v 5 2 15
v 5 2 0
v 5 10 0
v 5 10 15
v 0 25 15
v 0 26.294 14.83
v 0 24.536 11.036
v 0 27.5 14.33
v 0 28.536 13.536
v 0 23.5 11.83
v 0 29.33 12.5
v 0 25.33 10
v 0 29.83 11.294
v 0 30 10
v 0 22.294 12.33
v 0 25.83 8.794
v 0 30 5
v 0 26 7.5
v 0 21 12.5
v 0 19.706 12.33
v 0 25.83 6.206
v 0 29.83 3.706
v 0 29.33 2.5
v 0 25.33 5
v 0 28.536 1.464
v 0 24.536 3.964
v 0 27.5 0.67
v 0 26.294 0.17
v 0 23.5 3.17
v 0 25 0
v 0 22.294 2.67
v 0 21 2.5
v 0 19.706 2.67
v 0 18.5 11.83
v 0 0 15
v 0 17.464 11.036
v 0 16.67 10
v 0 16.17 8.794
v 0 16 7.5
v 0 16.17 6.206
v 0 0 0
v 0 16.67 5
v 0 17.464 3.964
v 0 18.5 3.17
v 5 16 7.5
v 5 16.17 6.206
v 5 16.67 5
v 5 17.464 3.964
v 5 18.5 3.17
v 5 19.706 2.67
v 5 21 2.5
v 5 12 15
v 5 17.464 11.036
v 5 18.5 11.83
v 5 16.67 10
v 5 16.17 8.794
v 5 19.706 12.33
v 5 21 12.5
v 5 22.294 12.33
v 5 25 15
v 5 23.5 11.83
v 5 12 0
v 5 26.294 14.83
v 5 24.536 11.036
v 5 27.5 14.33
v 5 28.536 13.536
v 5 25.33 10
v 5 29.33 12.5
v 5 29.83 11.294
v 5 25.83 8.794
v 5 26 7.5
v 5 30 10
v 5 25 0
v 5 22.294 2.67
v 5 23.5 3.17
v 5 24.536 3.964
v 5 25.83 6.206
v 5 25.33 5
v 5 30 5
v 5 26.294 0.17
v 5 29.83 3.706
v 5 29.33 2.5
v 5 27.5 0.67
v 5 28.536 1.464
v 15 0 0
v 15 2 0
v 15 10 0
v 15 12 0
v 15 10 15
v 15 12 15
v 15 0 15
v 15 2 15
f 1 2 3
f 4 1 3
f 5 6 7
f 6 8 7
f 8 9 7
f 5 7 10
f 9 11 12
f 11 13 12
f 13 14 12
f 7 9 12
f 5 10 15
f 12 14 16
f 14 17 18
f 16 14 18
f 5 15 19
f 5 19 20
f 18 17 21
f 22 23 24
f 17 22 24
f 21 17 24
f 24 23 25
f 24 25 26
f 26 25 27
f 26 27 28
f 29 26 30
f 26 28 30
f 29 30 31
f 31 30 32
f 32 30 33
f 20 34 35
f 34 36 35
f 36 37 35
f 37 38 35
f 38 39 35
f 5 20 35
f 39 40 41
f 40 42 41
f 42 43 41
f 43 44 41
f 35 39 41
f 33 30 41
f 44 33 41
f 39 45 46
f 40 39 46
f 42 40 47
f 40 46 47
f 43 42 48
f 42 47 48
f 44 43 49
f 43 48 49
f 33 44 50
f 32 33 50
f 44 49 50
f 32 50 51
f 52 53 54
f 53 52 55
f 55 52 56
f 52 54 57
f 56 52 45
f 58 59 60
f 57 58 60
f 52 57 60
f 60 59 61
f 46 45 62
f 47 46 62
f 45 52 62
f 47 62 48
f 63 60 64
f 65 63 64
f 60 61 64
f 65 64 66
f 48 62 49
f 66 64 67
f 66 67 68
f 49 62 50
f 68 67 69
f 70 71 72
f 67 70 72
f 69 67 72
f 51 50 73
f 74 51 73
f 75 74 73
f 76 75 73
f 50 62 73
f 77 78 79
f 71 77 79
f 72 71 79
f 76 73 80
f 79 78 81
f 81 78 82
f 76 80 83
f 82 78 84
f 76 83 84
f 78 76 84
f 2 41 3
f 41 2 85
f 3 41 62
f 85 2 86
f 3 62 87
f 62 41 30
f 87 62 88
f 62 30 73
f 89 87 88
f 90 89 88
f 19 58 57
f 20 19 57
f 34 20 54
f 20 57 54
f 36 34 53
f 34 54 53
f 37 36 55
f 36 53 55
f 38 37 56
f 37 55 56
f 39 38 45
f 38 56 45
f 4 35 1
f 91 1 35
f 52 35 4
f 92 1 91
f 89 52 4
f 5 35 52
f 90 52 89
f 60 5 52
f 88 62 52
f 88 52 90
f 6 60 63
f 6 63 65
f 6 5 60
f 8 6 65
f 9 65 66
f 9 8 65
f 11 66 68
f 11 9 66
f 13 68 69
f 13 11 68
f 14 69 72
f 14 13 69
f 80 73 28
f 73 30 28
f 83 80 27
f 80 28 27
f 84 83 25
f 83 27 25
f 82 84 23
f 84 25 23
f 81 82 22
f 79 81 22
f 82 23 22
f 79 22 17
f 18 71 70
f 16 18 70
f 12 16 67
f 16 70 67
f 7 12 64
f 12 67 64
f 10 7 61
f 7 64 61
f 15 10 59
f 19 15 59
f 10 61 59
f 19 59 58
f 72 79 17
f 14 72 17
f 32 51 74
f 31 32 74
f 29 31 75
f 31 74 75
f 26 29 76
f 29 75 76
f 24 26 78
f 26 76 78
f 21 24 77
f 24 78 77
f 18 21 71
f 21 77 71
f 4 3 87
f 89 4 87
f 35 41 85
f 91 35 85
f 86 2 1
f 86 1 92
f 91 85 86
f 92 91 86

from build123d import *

# Parameters (mm, degrees)
F0_W     = 10
F0_H     = 2
F1_DEPTH = 15
F3_DEPTH = 5
F4_R     = 5


with BuildPart() as f1:
    # F0 (on Top) → F1 (new body)
    with BuildSketch(Plane.XY):
        with Locations((10, 1)):
            Rectangle(F0_W, F0_H)
        with Locations((10, 11)):
            Rectangle(F0_W, F0_H)
        Polygon((0, 30), (0, 0), (5, 0), (5, 2), (5, 10), (5, 12), (5, 30), align=None)
    extrude(amount=F1_DEPTH)

    # F2 (on face) → F3 (cut, through all)
    with BuildSketch(Plane.YZ.offset(5)):
        with BuildLine():
            Line((21, 7.5), (21, 12.5))
            ThreePointArc((21, 12.5), (17.464466, 11.035534), (16, 7.5))
            Line((16, 7.5), (21, 7.5))
        make_face()
        with BuildLine():
            ThreePointArc((21, 2.5), (24.535534, 3.964466), (26, 7.5))
            Line((26, 7.5), (21, 7.5))
            Line((21, 7.5), (21, 2.5))
        make_face()
        with BuildLine():
            ThreePointArc((16, 7.5), (17.464466, 3.964466), (21, 2.5))
            Line((21, 2.5), (21, 7.5))
            Line((21, 7.5), (16, 7.5))
        make_face()
        with BuildLine():
            Line((21, 7.5), (26, 7.5))
            ThreePointArc((26, 7.5), (24.535534, 11.035534), (21, 12.5))
            Line((21, 12.5), (21, 7.5))
        make_face()
    extrude(amount=-F3_DEPTH, mode=Mode.SUBTRACT)

    # F4
    f4_edges = [f1.edges().sort_by_distance(p)[0] for p in [
        (2.5, 30, 15),
        (2.5, 30, 0),
    ]]
    fillet(f4_edges, radius=F4_R)


solid = f1.part
